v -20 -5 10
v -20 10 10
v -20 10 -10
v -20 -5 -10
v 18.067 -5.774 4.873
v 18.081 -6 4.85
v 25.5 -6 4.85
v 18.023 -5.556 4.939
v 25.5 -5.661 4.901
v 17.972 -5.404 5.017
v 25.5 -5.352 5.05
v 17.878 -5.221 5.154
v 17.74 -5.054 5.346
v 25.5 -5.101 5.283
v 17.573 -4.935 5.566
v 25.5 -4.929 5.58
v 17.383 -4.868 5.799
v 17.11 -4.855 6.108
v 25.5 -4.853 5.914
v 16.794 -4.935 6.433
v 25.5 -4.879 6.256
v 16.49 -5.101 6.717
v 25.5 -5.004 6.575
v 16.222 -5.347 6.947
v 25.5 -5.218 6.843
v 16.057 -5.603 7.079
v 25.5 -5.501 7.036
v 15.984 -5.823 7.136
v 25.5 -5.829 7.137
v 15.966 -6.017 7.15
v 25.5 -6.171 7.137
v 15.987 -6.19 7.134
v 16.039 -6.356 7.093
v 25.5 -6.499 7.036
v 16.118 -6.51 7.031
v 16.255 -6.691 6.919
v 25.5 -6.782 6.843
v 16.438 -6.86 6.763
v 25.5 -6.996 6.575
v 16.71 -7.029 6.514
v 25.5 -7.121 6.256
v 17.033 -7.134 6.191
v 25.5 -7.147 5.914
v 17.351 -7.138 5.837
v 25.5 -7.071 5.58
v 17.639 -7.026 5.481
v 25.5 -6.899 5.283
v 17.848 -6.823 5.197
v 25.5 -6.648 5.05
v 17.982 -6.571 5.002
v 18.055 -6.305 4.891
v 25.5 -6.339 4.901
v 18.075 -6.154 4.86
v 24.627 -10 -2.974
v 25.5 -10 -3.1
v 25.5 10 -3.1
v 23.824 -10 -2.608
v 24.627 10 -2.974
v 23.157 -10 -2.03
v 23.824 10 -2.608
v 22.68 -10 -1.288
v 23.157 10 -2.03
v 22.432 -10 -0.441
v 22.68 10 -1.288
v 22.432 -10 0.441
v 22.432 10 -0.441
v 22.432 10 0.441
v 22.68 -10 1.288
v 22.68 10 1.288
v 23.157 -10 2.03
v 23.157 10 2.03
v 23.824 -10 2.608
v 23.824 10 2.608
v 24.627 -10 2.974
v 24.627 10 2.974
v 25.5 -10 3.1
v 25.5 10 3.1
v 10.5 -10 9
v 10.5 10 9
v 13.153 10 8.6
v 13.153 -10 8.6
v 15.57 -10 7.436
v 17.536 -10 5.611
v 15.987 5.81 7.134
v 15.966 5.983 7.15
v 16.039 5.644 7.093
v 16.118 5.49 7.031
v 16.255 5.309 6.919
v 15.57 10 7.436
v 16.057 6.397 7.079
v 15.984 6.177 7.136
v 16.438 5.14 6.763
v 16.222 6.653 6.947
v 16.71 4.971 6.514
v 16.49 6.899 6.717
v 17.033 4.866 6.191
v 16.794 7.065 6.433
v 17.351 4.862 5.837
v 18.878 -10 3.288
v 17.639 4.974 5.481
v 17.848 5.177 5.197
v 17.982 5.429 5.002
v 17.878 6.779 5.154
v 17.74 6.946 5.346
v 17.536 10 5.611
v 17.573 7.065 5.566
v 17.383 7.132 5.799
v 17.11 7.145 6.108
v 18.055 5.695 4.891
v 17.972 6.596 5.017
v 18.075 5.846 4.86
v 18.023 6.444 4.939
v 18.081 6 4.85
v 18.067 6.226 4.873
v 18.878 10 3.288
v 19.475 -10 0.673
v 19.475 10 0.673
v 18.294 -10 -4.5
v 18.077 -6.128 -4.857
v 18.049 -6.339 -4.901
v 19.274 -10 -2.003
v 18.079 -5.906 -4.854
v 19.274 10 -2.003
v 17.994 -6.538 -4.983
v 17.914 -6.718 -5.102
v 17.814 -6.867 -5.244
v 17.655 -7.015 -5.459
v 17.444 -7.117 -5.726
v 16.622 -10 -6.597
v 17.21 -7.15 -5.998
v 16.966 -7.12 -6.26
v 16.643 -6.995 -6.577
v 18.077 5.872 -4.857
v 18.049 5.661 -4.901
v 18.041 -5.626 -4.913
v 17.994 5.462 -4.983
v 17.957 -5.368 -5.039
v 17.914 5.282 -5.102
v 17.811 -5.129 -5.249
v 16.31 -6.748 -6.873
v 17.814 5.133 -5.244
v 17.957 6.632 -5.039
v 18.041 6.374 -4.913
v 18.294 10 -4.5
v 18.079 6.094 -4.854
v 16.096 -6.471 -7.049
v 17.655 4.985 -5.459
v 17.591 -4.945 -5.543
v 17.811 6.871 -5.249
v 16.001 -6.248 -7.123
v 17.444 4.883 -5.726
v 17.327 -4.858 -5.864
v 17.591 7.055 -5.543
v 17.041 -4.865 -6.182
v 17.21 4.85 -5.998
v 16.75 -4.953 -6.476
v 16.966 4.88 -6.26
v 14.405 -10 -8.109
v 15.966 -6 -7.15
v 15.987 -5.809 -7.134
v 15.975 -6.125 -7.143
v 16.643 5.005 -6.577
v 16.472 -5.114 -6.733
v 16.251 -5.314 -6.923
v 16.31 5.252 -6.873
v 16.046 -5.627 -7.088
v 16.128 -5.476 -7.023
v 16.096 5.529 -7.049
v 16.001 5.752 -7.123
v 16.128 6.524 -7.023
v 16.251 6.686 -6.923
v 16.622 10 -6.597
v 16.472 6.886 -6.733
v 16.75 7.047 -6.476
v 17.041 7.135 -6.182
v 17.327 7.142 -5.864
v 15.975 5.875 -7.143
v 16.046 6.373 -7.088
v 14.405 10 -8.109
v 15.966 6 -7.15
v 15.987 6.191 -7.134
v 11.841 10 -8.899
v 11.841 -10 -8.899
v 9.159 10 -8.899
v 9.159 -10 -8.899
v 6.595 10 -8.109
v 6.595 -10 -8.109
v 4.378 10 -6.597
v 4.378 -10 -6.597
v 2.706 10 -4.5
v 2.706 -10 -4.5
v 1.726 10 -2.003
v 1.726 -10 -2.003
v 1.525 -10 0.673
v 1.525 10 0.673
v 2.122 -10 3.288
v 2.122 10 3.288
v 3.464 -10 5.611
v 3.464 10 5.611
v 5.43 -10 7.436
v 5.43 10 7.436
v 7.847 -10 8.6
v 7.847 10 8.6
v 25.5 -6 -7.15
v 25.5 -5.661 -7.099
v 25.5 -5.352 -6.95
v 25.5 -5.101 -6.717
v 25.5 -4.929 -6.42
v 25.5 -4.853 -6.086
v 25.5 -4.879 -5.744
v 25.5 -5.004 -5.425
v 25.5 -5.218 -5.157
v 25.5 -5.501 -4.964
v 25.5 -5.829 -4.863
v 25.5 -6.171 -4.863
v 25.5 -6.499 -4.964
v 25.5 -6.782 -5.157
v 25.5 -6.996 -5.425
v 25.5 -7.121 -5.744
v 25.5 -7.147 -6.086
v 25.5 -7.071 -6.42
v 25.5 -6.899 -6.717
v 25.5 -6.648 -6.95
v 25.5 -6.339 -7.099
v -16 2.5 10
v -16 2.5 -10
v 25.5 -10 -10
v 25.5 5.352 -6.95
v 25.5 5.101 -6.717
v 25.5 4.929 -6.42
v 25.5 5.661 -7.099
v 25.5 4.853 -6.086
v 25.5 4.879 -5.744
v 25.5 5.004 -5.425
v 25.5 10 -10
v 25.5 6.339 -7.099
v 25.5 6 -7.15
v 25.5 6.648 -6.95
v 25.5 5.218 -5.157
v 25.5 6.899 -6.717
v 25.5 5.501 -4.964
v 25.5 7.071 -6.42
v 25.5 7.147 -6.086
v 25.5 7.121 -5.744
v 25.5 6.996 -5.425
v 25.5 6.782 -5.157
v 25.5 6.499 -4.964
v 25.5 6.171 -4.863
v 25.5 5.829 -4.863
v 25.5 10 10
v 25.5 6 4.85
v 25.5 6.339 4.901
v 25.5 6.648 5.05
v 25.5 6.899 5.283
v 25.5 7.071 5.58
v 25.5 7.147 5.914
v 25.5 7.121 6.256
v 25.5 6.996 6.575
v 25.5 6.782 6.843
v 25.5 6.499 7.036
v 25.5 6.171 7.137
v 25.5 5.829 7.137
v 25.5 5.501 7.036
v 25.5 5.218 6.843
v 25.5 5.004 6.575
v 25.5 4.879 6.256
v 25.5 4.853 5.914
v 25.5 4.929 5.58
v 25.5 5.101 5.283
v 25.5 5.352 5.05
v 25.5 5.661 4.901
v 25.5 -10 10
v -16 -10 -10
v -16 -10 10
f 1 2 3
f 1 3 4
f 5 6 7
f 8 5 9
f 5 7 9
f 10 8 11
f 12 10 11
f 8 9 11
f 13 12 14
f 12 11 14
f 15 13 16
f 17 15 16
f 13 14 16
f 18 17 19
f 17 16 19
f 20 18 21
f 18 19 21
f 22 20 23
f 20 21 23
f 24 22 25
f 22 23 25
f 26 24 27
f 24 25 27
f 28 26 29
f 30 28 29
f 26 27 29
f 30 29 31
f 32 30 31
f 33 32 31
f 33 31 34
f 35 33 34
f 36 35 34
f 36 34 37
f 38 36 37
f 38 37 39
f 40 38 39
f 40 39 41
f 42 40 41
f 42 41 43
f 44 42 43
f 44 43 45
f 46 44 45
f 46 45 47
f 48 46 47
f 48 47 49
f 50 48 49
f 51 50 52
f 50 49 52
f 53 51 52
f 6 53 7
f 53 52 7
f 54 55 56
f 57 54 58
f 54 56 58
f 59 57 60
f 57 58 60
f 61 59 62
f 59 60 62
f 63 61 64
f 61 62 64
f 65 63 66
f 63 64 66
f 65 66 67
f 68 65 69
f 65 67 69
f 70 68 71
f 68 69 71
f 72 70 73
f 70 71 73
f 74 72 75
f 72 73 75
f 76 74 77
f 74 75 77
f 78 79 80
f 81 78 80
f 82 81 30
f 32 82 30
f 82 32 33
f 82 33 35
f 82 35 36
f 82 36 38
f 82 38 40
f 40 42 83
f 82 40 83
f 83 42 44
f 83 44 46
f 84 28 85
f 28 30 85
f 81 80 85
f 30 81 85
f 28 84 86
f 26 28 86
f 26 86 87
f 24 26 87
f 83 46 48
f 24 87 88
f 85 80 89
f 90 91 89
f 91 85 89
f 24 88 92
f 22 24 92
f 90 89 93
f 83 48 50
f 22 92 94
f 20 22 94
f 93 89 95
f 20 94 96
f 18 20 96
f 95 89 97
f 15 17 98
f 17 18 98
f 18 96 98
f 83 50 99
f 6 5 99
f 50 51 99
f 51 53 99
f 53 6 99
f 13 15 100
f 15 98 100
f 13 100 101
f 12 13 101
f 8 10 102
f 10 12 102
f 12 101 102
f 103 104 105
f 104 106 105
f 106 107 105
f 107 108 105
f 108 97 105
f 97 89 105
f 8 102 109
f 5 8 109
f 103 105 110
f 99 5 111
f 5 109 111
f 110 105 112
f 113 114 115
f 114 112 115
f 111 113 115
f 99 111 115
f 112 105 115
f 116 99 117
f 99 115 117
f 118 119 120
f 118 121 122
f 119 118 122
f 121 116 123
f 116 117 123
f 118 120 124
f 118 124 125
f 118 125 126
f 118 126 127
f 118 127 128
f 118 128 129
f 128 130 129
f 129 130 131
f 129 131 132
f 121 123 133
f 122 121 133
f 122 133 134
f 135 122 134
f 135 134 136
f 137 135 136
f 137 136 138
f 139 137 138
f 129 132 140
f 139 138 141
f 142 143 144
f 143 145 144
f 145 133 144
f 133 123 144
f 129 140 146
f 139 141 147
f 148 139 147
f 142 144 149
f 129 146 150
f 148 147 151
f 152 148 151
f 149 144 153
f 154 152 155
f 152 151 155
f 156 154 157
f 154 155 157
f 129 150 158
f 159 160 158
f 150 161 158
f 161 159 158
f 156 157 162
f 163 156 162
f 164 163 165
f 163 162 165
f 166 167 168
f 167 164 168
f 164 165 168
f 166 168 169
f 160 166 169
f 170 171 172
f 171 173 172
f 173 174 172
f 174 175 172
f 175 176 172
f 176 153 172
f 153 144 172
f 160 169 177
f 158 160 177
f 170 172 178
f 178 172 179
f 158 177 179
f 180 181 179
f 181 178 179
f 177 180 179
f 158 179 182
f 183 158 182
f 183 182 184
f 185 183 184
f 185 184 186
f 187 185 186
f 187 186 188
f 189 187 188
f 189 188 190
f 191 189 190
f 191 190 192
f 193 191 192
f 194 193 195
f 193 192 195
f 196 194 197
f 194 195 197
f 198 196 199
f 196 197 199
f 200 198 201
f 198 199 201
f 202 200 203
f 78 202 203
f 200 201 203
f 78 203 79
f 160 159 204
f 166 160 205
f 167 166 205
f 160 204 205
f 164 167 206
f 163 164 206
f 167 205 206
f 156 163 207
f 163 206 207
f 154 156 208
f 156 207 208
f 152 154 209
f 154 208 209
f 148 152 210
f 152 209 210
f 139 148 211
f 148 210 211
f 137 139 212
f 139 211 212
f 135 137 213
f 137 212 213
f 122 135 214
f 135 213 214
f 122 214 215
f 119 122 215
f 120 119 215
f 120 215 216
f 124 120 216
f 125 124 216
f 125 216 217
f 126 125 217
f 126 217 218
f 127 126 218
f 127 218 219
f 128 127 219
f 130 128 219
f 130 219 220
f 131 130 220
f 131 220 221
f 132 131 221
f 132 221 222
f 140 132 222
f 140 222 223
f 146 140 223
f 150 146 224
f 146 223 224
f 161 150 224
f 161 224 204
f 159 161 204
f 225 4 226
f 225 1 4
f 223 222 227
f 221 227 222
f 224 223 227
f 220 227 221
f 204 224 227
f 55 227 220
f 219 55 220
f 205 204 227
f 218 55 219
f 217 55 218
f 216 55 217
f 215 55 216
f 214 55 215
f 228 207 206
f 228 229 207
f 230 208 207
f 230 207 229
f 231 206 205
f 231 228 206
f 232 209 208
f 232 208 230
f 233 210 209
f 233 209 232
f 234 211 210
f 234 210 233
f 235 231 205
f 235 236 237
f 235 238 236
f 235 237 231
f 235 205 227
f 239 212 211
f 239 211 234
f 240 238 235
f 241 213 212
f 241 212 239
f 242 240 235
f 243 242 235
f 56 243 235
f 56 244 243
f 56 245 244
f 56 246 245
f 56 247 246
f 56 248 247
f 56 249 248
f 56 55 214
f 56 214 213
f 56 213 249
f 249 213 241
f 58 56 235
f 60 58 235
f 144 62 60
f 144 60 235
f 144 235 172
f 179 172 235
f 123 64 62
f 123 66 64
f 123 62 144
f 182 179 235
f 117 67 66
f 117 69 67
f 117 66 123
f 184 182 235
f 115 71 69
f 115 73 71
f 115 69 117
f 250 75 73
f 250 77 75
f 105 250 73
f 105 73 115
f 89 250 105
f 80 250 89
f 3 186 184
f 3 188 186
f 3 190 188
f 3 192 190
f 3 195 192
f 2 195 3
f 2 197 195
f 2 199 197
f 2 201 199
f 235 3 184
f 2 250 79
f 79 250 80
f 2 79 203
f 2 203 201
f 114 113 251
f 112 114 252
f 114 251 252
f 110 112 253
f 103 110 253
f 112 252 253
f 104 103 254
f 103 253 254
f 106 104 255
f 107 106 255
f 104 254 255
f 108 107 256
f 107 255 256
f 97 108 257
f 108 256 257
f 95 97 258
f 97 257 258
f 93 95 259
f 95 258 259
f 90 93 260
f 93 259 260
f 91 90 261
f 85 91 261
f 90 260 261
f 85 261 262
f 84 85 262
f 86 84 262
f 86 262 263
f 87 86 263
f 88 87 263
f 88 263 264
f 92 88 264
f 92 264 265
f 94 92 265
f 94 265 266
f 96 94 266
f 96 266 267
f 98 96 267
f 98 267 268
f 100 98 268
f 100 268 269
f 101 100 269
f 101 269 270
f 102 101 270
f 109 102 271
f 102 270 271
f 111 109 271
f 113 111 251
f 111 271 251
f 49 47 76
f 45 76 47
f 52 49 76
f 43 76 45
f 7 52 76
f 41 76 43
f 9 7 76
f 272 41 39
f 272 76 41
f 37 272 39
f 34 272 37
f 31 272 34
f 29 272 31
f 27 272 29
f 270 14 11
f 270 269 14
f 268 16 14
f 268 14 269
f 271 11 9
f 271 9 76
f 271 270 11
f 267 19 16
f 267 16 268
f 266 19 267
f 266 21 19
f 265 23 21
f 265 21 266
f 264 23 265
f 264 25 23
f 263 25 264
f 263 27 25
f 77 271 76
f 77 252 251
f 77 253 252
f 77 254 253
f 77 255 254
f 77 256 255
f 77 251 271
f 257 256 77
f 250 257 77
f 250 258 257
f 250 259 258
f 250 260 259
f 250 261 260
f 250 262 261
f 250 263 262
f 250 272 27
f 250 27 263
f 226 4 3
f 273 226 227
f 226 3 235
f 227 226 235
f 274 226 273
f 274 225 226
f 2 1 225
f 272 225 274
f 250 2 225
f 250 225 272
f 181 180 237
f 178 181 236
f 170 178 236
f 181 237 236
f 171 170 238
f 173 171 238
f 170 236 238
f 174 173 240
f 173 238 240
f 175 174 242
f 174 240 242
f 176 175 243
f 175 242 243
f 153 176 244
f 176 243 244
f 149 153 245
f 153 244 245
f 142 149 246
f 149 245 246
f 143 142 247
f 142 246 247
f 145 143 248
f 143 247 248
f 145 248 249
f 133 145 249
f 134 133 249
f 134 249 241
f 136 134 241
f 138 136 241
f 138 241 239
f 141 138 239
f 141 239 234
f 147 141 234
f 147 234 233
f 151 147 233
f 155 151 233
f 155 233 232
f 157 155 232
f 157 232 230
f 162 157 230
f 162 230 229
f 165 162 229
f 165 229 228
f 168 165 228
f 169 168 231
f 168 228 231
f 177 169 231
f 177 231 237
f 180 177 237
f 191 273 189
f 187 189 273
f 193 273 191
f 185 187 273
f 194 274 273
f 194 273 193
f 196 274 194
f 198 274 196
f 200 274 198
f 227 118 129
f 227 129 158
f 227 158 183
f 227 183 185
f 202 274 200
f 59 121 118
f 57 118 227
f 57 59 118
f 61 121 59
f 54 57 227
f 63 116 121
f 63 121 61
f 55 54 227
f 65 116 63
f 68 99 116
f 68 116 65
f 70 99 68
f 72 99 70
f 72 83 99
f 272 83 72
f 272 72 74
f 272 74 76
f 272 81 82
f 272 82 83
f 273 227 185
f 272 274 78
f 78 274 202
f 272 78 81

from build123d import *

# Parameters (mm, degrees)
BOSS_EXTRUDE1_DEPTH = 10
CUT_EXTRUDE1_REACH  = 35.915
SKETCH3_R           = 9
SKETCH3_R_2         = 3.1
SKETCH4_R           = 1.15
CUT_EXTRUDE2_DEPTH  = 10


with BuildPart() as part:
    # Sketch2 → Boss-Extrude1 (new, symmetric)
    with BuildSketch(Plane.XY):
        Polygon((-16, -10), (25.5, -10), (25.5, 10), (-20, 10), (-20, -5), (-16, 2.5), align=None)
    extrude(amount=BOSS_EXTRUDE1_DEPTH, both=True)

    # Sketch3 → Cut-Extrude1 (cut, up to next)
    with BuildSketch(Plane(origin=(0, 10, 0), x_dir=(1, 0, 0), z_dir=(0, 1, 0)), mode=Mode.PRIVATE) as cut_extrude1_sk1:
        with Locations(Location((10.5, 0, 0), (0, 0, 270))):
            Circle(SKETCH3_R)
    cut_extrude1_tool1 = extrude(cut_extrude1_sk1.sketch, amount=-CUT_EXTRUDE1_REACH, mode=Mode.PRIVATE) & part.part
    # Sketch3 → Cut-Extrude1 (cut, up to next)
    with BuildSketch(Plane(origin=(0, 10, 0), x_dir=(1, 0, 0), z_dir=(0, 1, 0)), mode=Mode.PRIVATE) as cut_extrude1_sk2:
        with Locations((25.5, 0)):
            Circle(SKETCH3_R_2)
    cut_extrude1_tool2 = extrude(cut_extrude1_sk2.sketch, amount=-CUT_EXTRUDE1_REACH, mode=Mode.PRIVATE) & part.part
    add(cut_extrude1_tool1.solids().sort_by_distance((10.5, 10, 0))[0], mode=Mode.SUBTRACT)
    add(cut_extrude1_tool2.solids().sort_by_distance((25.5, 10, 0))[0], mode=Mode.SUBTRACT)

    # Sketch4 → Cut-Extrude2 (cut)
    with BuildSketch(Plane(origin=(25.5, 0, 0), x_dir=(0, 0, -1), z_dir=(1, 0, 0))):
        with Locations((-6, 6)):
            Circle(SKETCH4_R)
        with Locations((-6, -6)):
            Circle(SKETCH4_R)
        with Locations((6, -6)):
            Circle(SKETCH4_R)
        with Locations((6, 6)):
            Circle(SKETCH4_R)
    extrude(amount=-CUT_EXTRUDE2_DEPTH, mode=Mode.SUBTRACT)


solid = part.part
